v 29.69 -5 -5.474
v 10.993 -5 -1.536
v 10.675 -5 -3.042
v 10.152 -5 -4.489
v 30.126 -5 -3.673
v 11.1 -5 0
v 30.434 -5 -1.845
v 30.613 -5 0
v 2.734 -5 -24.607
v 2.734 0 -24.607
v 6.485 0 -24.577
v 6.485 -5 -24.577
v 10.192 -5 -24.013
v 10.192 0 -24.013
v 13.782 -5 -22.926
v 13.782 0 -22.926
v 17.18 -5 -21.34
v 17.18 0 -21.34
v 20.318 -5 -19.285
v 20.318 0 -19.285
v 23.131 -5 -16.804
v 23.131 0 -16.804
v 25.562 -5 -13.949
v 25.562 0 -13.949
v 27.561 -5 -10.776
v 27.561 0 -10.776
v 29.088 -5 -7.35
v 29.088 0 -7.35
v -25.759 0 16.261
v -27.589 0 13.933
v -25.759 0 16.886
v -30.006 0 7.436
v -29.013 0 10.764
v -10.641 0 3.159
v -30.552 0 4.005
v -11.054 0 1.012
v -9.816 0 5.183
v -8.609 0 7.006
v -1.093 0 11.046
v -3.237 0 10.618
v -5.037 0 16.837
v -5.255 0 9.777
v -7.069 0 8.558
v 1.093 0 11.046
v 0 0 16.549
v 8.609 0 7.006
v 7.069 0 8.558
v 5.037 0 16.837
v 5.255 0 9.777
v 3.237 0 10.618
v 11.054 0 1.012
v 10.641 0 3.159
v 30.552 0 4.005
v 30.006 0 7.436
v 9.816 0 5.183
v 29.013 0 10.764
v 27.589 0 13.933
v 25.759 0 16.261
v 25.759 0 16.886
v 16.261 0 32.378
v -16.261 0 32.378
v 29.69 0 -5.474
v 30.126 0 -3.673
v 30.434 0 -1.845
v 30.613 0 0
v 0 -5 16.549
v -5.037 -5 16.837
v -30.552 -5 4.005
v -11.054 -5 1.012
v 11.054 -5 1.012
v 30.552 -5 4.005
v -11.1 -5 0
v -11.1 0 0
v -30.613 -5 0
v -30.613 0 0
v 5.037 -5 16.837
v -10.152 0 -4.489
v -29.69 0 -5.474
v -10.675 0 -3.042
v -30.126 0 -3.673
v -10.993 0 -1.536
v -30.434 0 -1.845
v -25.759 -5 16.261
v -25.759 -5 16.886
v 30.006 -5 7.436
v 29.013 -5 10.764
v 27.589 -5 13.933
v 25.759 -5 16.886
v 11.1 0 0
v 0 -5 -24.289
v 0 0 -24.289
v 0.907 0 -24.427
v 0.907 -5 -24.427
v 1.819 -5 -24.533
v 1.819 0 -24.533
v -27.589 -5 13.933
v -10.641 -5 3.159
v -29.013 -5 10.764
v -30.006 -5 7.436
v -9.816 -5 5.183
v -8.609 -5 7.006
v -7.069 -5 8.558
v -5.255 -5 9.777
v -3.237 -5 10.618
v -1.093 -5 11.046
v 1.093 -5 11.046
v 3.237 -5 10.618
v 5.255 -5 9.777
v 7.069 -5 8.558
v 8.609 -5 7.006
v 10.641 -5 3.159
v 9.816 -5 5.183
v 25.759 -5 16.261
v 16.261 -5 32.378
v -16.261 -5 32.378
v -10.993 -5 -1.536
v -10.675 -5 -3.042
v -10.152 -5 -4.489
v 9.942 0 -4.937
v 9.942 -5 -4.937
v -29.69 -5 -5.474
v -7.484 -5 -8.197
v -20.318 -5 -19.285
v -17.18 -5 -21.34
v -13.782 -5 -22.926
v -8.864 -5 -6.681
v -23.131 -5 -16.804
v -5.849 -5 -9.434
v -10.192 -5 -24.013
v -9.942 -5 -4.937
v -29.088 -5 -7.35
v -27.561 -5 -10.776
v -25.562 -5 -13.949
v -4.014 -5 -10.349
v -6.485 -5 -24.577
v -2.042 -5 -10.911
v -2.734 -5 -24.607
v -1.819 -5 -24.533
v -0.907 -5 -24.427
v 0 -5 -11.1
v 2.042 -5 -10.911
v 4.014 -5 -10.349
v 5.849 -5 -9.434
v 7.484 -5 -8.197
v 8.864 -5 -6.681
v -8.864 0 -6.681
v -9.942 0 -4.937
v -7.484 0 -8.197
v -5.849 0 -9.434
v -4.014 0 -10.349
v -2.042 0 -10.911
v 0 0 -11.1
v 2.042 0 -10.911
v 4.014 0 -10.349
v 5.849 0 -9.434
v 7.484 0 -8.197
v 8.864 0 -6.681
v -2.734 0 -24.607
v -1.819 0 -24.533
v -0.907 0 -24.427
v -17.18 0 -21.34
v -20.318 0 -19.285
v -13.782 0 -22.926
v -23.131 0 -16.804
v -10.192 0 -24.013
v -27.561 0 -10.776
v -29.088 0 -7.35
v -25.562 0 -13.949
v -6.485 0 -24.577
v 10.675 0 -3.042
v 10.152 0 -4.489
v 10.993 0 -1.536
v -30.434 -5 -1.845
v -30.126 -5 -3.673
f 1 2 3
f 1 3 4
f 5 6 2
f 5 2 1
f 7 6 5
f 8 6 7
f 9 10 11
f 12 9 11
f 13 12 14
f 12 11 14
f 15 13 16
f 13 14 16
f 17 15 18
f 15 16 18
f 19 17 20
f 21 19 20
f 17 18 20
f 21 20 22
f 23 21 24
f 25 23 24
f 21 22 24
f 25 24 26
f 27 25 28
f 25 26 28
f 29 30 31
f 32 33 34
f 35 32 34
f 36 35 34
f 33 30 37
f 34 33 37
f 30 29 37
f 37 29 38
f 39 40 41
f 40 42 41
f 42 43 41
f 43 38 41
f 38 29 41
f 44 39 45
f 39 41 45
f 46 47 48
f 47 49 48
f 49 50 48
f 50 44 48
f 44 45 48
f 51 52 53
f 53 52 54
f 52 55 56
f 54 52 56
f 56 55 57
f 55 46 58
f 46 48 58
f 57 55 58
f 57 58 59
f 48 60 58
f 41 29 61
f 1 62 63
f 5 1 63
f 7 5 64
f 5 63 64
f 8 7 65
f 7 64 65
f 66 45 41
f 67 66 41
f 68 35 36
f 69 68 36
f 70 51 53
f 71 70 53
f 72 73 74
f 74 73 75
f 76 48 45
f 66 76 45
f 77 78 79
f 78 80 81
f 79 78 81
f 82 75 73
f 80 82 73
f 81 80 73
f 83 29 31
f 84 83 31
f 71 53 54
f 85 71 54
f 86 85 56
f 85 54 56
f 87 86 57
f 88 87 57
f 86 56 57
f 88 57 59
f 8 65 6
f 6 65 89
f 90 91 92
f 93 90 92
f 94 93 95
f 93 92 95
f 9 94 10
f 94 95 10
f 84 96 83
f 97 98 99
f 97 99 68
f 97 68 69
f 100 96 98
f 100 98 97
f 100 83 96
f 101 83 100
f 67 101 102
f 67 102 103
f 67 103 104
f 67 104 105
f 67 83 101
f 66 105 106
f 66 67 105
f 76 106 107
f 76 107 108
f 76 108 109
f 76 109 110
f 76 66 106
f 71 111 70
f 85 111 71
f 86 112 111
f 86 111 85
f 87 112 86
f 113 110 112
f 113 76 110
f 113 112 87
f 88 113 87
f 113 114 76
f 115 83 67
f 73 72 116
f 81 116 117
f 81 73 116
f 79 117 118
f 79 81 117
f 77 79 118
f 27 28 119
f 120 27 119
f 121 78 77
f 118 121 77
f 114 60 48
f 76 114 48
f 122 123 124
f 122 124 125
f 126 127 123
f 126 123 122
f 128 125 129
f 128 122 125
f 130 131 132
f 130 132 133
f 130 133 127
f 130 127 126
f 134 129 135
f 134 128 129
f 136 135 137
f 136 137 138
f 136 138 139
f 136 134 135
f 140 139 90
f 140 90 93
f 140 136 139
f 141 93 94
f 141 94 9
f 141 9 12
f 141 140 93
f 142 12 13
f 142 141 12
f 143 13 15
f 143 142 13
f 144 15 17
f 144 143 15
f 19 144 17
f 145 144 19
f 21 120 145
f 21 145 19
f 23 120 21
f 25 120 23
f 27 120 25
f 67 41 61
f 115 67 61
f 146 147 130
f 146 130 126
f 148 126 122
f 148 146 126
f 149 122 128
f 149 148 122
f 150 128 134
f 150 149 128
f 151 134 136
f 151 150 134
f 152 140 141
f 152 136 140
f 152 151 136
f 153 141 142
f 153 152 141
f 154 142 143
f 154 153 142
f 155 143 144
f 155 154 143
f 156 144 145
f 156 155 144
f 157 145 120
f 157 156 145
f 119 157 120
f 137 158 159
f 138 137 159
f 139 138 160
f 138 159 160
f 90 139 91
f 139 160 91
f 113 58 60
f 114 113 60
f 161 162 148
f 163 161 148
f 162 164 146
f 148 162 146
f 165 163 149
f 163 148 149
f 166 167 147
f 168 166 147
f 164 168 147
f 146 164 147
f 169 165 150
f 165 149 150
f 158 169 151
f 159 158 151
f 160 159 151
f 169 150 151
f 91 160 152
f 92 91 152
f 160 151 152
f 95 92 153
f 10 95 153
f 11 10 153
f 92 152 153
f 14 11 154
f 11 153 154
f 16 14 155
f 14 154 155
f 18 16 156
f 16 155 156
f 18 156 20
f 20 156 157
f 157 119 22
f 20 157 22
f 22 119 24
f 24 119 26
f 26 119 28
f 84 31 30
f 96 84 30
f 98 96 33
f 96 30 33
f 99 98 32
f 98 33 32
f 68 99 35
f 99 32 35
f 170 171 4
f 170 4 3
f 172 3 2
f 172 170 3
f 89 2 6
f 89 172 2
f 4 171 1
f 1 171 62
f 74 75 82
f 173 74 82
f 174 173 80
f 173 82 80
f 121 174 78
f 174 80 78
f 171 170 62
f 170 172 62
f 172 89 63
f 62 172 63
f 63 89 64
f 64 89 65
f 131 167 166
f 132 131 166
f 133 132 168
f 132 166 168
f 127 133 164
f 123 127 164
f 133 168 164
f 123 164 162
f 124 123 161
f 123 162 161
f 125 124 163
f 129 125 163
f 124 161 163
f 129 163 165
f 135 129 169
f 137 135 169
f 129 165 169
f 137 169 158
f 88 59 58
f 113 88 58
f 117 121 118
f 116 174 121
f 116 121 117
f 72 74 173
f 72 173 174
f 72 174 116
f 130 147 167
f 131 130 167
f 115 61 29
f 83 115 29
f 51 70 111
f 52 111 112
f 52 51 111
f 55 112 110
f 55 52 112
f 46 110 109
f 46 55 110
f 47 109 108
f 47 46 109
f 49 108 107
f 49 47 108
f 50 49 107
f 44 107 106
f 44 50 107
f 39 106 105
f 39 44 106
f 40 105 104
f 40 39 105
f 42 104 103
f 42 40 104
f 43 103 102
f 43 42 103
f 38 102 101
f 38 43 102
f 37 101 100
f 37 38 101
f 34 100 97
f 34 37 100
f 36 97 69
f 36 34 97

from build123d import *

# Parameters (mm, degrees)
F2_DEPTH = 5
F0_R     = 11.1
F3_DEPTH = 25


with BuildPart() as f2:
    # F1 (on Front) → F2 (new body)
    with BuildSketch(Plane.XZ):
        with BuildLine():
            Line((16.261037, 32.378148), (5.036615, 16.836636))
            Line((5.036615, 16.836636), (0, 16.548829))
            Line((0, 16.548829), (-5.036615, 16.836636))
            Line((-5.036615, 16.836636), (-16.261037, 32.378148))
            Line((-16.261037, 32.378148), (-25.75863, 16.261024))
            Line((-25.75863, 16.261024), (-25.75863, 16.885607))
            ThreePointArc((-25.75863, 16.885607), (-29.01269, 10.764473), (-30.551896, 4.00518))
            Line((-30.551896, 4.00518), (-4.461003, 0))
            Line((-4.461003, 0), (-30.612821, 0))
            ThreePointArc((-30.612821, 0), (-30.296459, -2.761579), (-29.690012, -5.474258))
            Line((-29.690012, -5.474258), (-3.885392, -4.173185))
            Line((-3.885392, -4.173185), (-29.088335, -7.350026))
            ThreePointArc((-29.088335, -7.350026), (-18.785708, -20.368363), (-2.73417, -24.607392))
            ThreePointArc((-2.73417, -24.607392), (-1.362916, -24.484219), (0, -24.289359))
            ThreePointArc((0, -24.289359), (1.362916, -24.484219), (2.73417, -24.607392))
            ThreePointArc((2.73417, -24.607392), (18.785708, -20.368363), (29.088335, -7.350026))
            Line((29.088335, -7.350026), (3.885392, -4.173185))
            Line((3.885392, -4.173185), (29.690012, -5.474258))
            ThreePointArc((29.690012, -5.474258), (30.296459, -2.761579), (30.612821, 0))
            Line((30.612821, 0), (4.461003, 0))
            Line((4.461003, 0), (30.551896, 4.00518))
            ThreePointArc((30.551896, 4.00518), (29.01269, 10.764473), (25.75863, 16.885607))
            Line((25.75863, 16.885607), (25.75863, 16.261024))
            Line((25.75863, 16.261024), (16.261037, 32.378148))
        make_face()
    extrude(amount=F2_DEPTH)

    # F0 (on Front) → F3 (cut)
    with BuildSketch(Plane.XZ):
        Circle(F0_R)
    extrude(amount=F3_DEPTH, mode=Mode.SUBTRACT)


solid = f2.part
